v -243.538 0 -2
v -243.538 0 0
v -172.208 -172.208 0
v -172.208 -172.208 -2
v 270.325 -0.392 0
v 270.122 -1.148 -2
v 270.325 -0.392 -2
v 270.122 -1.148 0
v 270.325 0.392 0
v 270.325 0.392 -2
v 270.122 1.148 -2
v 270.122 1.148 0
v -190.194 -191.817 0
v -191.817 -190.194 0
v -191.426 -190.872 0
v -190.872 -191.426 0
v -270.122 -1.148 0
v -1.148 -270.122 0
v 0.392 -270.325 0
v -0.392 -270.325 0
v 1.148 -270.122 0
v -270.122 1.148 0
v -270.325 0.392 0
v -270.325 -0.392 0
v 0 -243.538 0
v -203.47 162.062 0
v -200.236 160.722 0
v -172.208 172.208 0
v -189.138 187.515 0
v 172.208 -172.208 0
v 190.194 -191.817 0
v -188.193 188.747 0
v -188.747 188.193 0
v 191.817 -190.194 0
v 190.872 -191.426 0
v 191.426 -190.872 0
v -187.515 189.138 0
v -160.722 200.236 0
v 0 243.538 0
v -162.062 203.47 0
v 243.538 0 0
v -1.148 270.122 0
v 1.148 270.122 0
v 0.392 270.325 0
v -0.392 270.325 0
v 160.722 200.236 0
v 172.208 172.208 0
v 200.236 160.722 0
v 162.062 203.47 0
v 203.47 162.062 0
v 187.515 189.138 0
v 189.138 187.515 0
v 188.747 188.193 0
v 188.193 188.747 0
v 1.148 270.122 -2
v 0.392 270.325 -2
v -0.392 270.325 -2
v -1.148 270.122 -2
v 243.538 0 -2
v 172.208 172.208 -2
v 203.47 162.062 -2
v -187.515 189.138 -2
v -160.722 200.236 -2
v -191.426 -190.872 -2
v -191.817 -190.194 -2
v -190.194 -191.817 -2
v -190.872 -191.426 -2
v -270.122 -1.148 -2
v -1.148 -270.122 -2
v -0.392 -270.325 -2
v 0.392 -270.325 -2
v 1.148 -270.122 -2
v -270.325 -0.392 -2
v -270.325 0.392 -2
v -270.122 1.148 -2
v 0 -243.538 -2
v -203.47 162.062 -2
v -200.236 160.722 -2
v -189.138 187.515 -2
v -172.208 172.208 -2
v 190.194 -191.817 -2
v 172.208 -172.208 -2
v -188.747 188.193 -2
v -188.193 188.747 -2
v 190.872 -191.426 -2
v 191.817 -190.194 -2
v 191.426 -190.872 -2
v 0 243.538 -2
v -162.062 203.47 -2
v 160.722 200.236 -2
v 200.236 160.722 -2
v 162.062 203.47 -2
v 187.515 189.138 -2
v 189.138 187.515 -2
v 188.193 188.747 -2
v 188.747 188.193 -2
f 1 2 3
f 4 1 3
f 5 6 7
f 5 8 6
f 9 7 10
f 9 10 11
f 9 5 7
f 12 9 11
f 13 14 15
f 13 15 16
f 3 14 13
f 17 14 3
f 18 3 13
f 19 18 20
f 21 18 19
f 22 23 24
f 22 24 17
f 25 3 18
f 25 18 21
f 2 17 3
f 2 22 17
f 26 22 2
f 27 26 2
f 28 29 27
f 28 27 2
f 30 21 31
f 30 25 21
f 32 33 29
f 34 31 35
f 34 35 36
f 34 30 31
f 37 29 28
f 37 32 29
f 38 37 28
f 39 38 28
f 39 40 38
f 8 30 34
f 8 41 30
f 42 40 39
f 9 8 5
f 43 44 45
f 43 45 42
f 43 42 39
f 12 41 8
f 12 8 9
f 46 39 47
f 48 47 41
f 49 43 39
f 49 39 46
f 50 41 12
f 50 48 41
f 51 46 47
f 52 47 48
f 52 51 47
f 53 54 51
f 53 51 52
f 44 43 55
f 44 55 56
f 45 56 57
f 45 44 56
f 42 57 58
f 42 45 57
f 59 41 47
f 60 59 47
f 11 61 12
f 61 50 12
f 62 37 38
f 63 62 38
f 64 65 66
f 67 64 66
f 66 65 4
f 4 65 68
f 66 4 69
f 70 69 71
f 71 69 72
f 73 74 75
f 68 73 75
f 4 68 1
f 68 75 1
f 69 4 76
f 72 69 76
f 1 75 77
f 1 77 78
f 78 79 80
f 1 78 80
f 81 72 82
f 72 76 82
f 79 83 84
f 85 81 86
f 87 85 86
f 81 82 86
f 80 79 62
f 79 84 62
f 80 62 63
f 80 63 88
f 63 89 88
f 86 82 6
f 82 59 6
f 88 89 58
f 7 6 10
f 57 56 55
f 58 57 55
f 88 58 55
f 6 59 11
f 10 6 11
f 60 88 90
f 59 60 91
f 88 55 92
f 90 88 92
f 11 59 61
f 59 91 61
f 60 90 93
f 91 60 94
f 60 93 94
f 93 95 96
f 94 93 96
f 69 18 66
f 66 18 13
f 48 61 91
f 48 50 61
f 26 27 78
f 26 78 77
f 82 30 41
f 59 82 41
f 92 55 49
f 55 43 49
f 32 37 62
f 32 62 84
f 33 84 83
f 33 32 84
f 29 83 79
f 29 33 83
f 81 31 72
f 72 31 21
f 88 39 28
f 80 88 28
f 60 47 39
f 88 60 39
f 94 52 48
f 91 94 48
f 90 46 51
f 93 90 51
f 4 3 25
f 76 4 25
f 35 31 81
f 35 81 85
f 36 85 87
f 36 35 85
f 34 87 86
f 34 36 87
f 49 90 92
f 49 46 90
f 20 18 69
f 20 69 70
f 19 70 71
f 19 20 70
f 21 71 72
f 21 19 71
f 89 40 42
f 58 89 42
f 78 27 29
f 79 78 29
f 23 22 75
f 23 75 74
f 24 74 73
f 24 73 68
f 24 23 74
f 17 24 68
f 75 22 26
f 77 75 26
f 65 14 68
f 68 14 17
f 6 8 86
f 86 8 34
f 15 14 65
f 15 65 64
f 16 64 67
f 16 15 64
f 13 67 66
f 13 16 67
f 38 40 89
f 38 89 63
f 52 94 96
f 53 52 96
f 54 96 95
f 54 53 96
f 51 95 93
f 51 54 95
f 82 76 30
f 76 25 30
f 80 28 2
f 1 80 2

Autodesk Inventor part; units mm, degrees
ref_plane "YZ Plane" through (0, 0, 0) normal (1, 0, 0) x (0, 1, 0)
ref_plane "XZ Plane" through (0, 0, 0) normal (0, 1, 0) x (-1, 0, 0)
ref_plane "XY Plane" through (0, 0, 0) normal (0, 0, 1) x (1, 0, 0)
sketch "Sketch1" plane through (0, 0, 0) normal (0, 0, 1) x (1, 0, 0)
  line L0 (1.1481, 270.1225) -> (190.1937, 191.8173)
  line L1 (191.8173, 190.1937) -> (270.1225, 1.1481)
  line L2 (270.1225, -1.1481) -> (191.8173, -190.1937)
  line L3 (190.1937, -191.8173) -> (1.1481, -270.1225)
  line L4 (-1.1481, -270.1225) -> (-190.1937, -191.8173)
  line L5 (-191.8173, -190.1937) -> (-270.1225, -1.1481)
  line L6 (-270.1225, 1.1481) -> (-191.8173, 190.1937)
  line L7 (-190.1937, 191.8173) -> (-1.1481, 270.1225)
  line L8 (172.2075, 172.2075) -> (0, 243.5382)
  line L9 (0, 243.5382) -> (-172.2075, 172.2075)
  line L10 (-172.2075, 172.2075) -> (-243.5382, 0)
  line L11 (-243.5382, 0) -> (-172.2075, -172.2075)
  line L12 (-172.2075, -172.2075) -> (0, -243.5382)
  line L13 (0, -243.5382) -> (172.2075, -172.2075)
  line L14 (172.2075, -172.2075) -> (243.5382, 0)
  line L15 (243.5382, 0) -> (172.2075, 172.2075)
  arc A0 (1.1481, 270.1225) -> (-1.1481, 270.1225) centre (0, 267.3509) ccw
  arc A1 (-190.1937, 191.8173) -> (-191.8173, 190.1937) centre (-189.0456, 189.0456) ccw
  arc A2 (-270.1225, 1.1481) -> (-270.1225, -1.1481) centre (-267.3509, 0) ccw
  arc A3 (-191.8173, -190.1937) -> (-190.1937, -191.8173) centre (-189.0456, -189.0456) ccw
  arc A4 (-1.1481, -270.1225) -> (1.1481, -270.1225) centre (0, -267.3509) ccw
  arc A5 (190.1937, -191.8173) -> (191.8173, -190.1937) centre (189.0456, -189.0456) ccw
  arc A6 (270.1225, -1.1481) -> (270.1225, 1.1481) centre (267.3509, 0) ccw
  arc A7 (191.8173, 190.1937) -> (190.1937, 191.8173) centre (189.0456, 189.0456) ccw
  point P0 (0, 0)
  point P1 (0, 0)
  point P2 (0, 270.5981)
  point P3 (191.3417, 191.3417)
  point P4 (270.5981, 0)
  point P5 (191.3417, -191.3417)
  point P6 (0, -270.5981)
  point P7 (-191.3417, -191.3417)
  point P8 (-270.5981, 0)
  point P9 (-191.3417, 191.3417)
  dimension "d18" = 500
  dimension "d19" = 25
  dimension "d20" = 3
  dimension "d22" = 3
extrude "Plate2" add sketch "Sketch1" against normal blind 2
sketch "Sketch3" plane through (0, 0, 0) normal (0, 0, 1) x (1, 0, 0)
  line L0 (-191.8173, 190.1937) -> (-270.1225, 1.1481) projected
  arc A0 (-190.1937, 191.8173) -> (-191.8173, 190.1937) centre (-189.0456, 189.0456) ccw projected
  line L1 (-1.1481, 270.1225) -> (-190.1937, 191.8173) projected
  line L2 (-200.2363, 160.7224) -> (-189.1385, 187.5149)
  line L3 (-187.5149, 189.1385) -> (-160.7224, 200.2363)
  arc A1 (-187.5149, 189.1385) -> (-189.1385, 187.5149) centre (-186.3668, 186.3668) ccw
  line L4 (-162.0618, 203.4699) -> (-160.7224, 200.2363)
  line L5 (-200.2363, 160.7224) -> (-203.4699, 162.0618)
  point P0 (0, 0)
  dimension "d23" = 3.5
  dimension "d24" = 3
  dimension "d25" = 29
  dimension "d26" = 3.5
extrude "Extrusion1" cut sketch "Sketch3" against normal up to surface (2 mm away)
mirror "Mirror1" about plane through (0, 0, 0) normal (1, 0, 0) of "Extrusion1"
equation "\"d22\" = d20"
equation "\"d21\" = Thickness"
equation "\"BendRadius\" = Thickness"
equation "\"BendReliefWidth\" = Thickness"
equation "\"BendReliefDepth\" = 0.5 * Thickness"
equation "\"CornerReliefSize\" = 4 * Thickness"
equation "\"MinimumRemnant\" = 2 * Thickness"
equation "\"TransitionRadius\" = BendRadius"
equation "\"JacobiRadiusSize\" = BendRadius"
equation "\"GapSize\" = Thickness"
equation "\"Thickness\" = 2"
properties part number "ДМС 104.1 Сектор кольца усилителя барабана полный"
